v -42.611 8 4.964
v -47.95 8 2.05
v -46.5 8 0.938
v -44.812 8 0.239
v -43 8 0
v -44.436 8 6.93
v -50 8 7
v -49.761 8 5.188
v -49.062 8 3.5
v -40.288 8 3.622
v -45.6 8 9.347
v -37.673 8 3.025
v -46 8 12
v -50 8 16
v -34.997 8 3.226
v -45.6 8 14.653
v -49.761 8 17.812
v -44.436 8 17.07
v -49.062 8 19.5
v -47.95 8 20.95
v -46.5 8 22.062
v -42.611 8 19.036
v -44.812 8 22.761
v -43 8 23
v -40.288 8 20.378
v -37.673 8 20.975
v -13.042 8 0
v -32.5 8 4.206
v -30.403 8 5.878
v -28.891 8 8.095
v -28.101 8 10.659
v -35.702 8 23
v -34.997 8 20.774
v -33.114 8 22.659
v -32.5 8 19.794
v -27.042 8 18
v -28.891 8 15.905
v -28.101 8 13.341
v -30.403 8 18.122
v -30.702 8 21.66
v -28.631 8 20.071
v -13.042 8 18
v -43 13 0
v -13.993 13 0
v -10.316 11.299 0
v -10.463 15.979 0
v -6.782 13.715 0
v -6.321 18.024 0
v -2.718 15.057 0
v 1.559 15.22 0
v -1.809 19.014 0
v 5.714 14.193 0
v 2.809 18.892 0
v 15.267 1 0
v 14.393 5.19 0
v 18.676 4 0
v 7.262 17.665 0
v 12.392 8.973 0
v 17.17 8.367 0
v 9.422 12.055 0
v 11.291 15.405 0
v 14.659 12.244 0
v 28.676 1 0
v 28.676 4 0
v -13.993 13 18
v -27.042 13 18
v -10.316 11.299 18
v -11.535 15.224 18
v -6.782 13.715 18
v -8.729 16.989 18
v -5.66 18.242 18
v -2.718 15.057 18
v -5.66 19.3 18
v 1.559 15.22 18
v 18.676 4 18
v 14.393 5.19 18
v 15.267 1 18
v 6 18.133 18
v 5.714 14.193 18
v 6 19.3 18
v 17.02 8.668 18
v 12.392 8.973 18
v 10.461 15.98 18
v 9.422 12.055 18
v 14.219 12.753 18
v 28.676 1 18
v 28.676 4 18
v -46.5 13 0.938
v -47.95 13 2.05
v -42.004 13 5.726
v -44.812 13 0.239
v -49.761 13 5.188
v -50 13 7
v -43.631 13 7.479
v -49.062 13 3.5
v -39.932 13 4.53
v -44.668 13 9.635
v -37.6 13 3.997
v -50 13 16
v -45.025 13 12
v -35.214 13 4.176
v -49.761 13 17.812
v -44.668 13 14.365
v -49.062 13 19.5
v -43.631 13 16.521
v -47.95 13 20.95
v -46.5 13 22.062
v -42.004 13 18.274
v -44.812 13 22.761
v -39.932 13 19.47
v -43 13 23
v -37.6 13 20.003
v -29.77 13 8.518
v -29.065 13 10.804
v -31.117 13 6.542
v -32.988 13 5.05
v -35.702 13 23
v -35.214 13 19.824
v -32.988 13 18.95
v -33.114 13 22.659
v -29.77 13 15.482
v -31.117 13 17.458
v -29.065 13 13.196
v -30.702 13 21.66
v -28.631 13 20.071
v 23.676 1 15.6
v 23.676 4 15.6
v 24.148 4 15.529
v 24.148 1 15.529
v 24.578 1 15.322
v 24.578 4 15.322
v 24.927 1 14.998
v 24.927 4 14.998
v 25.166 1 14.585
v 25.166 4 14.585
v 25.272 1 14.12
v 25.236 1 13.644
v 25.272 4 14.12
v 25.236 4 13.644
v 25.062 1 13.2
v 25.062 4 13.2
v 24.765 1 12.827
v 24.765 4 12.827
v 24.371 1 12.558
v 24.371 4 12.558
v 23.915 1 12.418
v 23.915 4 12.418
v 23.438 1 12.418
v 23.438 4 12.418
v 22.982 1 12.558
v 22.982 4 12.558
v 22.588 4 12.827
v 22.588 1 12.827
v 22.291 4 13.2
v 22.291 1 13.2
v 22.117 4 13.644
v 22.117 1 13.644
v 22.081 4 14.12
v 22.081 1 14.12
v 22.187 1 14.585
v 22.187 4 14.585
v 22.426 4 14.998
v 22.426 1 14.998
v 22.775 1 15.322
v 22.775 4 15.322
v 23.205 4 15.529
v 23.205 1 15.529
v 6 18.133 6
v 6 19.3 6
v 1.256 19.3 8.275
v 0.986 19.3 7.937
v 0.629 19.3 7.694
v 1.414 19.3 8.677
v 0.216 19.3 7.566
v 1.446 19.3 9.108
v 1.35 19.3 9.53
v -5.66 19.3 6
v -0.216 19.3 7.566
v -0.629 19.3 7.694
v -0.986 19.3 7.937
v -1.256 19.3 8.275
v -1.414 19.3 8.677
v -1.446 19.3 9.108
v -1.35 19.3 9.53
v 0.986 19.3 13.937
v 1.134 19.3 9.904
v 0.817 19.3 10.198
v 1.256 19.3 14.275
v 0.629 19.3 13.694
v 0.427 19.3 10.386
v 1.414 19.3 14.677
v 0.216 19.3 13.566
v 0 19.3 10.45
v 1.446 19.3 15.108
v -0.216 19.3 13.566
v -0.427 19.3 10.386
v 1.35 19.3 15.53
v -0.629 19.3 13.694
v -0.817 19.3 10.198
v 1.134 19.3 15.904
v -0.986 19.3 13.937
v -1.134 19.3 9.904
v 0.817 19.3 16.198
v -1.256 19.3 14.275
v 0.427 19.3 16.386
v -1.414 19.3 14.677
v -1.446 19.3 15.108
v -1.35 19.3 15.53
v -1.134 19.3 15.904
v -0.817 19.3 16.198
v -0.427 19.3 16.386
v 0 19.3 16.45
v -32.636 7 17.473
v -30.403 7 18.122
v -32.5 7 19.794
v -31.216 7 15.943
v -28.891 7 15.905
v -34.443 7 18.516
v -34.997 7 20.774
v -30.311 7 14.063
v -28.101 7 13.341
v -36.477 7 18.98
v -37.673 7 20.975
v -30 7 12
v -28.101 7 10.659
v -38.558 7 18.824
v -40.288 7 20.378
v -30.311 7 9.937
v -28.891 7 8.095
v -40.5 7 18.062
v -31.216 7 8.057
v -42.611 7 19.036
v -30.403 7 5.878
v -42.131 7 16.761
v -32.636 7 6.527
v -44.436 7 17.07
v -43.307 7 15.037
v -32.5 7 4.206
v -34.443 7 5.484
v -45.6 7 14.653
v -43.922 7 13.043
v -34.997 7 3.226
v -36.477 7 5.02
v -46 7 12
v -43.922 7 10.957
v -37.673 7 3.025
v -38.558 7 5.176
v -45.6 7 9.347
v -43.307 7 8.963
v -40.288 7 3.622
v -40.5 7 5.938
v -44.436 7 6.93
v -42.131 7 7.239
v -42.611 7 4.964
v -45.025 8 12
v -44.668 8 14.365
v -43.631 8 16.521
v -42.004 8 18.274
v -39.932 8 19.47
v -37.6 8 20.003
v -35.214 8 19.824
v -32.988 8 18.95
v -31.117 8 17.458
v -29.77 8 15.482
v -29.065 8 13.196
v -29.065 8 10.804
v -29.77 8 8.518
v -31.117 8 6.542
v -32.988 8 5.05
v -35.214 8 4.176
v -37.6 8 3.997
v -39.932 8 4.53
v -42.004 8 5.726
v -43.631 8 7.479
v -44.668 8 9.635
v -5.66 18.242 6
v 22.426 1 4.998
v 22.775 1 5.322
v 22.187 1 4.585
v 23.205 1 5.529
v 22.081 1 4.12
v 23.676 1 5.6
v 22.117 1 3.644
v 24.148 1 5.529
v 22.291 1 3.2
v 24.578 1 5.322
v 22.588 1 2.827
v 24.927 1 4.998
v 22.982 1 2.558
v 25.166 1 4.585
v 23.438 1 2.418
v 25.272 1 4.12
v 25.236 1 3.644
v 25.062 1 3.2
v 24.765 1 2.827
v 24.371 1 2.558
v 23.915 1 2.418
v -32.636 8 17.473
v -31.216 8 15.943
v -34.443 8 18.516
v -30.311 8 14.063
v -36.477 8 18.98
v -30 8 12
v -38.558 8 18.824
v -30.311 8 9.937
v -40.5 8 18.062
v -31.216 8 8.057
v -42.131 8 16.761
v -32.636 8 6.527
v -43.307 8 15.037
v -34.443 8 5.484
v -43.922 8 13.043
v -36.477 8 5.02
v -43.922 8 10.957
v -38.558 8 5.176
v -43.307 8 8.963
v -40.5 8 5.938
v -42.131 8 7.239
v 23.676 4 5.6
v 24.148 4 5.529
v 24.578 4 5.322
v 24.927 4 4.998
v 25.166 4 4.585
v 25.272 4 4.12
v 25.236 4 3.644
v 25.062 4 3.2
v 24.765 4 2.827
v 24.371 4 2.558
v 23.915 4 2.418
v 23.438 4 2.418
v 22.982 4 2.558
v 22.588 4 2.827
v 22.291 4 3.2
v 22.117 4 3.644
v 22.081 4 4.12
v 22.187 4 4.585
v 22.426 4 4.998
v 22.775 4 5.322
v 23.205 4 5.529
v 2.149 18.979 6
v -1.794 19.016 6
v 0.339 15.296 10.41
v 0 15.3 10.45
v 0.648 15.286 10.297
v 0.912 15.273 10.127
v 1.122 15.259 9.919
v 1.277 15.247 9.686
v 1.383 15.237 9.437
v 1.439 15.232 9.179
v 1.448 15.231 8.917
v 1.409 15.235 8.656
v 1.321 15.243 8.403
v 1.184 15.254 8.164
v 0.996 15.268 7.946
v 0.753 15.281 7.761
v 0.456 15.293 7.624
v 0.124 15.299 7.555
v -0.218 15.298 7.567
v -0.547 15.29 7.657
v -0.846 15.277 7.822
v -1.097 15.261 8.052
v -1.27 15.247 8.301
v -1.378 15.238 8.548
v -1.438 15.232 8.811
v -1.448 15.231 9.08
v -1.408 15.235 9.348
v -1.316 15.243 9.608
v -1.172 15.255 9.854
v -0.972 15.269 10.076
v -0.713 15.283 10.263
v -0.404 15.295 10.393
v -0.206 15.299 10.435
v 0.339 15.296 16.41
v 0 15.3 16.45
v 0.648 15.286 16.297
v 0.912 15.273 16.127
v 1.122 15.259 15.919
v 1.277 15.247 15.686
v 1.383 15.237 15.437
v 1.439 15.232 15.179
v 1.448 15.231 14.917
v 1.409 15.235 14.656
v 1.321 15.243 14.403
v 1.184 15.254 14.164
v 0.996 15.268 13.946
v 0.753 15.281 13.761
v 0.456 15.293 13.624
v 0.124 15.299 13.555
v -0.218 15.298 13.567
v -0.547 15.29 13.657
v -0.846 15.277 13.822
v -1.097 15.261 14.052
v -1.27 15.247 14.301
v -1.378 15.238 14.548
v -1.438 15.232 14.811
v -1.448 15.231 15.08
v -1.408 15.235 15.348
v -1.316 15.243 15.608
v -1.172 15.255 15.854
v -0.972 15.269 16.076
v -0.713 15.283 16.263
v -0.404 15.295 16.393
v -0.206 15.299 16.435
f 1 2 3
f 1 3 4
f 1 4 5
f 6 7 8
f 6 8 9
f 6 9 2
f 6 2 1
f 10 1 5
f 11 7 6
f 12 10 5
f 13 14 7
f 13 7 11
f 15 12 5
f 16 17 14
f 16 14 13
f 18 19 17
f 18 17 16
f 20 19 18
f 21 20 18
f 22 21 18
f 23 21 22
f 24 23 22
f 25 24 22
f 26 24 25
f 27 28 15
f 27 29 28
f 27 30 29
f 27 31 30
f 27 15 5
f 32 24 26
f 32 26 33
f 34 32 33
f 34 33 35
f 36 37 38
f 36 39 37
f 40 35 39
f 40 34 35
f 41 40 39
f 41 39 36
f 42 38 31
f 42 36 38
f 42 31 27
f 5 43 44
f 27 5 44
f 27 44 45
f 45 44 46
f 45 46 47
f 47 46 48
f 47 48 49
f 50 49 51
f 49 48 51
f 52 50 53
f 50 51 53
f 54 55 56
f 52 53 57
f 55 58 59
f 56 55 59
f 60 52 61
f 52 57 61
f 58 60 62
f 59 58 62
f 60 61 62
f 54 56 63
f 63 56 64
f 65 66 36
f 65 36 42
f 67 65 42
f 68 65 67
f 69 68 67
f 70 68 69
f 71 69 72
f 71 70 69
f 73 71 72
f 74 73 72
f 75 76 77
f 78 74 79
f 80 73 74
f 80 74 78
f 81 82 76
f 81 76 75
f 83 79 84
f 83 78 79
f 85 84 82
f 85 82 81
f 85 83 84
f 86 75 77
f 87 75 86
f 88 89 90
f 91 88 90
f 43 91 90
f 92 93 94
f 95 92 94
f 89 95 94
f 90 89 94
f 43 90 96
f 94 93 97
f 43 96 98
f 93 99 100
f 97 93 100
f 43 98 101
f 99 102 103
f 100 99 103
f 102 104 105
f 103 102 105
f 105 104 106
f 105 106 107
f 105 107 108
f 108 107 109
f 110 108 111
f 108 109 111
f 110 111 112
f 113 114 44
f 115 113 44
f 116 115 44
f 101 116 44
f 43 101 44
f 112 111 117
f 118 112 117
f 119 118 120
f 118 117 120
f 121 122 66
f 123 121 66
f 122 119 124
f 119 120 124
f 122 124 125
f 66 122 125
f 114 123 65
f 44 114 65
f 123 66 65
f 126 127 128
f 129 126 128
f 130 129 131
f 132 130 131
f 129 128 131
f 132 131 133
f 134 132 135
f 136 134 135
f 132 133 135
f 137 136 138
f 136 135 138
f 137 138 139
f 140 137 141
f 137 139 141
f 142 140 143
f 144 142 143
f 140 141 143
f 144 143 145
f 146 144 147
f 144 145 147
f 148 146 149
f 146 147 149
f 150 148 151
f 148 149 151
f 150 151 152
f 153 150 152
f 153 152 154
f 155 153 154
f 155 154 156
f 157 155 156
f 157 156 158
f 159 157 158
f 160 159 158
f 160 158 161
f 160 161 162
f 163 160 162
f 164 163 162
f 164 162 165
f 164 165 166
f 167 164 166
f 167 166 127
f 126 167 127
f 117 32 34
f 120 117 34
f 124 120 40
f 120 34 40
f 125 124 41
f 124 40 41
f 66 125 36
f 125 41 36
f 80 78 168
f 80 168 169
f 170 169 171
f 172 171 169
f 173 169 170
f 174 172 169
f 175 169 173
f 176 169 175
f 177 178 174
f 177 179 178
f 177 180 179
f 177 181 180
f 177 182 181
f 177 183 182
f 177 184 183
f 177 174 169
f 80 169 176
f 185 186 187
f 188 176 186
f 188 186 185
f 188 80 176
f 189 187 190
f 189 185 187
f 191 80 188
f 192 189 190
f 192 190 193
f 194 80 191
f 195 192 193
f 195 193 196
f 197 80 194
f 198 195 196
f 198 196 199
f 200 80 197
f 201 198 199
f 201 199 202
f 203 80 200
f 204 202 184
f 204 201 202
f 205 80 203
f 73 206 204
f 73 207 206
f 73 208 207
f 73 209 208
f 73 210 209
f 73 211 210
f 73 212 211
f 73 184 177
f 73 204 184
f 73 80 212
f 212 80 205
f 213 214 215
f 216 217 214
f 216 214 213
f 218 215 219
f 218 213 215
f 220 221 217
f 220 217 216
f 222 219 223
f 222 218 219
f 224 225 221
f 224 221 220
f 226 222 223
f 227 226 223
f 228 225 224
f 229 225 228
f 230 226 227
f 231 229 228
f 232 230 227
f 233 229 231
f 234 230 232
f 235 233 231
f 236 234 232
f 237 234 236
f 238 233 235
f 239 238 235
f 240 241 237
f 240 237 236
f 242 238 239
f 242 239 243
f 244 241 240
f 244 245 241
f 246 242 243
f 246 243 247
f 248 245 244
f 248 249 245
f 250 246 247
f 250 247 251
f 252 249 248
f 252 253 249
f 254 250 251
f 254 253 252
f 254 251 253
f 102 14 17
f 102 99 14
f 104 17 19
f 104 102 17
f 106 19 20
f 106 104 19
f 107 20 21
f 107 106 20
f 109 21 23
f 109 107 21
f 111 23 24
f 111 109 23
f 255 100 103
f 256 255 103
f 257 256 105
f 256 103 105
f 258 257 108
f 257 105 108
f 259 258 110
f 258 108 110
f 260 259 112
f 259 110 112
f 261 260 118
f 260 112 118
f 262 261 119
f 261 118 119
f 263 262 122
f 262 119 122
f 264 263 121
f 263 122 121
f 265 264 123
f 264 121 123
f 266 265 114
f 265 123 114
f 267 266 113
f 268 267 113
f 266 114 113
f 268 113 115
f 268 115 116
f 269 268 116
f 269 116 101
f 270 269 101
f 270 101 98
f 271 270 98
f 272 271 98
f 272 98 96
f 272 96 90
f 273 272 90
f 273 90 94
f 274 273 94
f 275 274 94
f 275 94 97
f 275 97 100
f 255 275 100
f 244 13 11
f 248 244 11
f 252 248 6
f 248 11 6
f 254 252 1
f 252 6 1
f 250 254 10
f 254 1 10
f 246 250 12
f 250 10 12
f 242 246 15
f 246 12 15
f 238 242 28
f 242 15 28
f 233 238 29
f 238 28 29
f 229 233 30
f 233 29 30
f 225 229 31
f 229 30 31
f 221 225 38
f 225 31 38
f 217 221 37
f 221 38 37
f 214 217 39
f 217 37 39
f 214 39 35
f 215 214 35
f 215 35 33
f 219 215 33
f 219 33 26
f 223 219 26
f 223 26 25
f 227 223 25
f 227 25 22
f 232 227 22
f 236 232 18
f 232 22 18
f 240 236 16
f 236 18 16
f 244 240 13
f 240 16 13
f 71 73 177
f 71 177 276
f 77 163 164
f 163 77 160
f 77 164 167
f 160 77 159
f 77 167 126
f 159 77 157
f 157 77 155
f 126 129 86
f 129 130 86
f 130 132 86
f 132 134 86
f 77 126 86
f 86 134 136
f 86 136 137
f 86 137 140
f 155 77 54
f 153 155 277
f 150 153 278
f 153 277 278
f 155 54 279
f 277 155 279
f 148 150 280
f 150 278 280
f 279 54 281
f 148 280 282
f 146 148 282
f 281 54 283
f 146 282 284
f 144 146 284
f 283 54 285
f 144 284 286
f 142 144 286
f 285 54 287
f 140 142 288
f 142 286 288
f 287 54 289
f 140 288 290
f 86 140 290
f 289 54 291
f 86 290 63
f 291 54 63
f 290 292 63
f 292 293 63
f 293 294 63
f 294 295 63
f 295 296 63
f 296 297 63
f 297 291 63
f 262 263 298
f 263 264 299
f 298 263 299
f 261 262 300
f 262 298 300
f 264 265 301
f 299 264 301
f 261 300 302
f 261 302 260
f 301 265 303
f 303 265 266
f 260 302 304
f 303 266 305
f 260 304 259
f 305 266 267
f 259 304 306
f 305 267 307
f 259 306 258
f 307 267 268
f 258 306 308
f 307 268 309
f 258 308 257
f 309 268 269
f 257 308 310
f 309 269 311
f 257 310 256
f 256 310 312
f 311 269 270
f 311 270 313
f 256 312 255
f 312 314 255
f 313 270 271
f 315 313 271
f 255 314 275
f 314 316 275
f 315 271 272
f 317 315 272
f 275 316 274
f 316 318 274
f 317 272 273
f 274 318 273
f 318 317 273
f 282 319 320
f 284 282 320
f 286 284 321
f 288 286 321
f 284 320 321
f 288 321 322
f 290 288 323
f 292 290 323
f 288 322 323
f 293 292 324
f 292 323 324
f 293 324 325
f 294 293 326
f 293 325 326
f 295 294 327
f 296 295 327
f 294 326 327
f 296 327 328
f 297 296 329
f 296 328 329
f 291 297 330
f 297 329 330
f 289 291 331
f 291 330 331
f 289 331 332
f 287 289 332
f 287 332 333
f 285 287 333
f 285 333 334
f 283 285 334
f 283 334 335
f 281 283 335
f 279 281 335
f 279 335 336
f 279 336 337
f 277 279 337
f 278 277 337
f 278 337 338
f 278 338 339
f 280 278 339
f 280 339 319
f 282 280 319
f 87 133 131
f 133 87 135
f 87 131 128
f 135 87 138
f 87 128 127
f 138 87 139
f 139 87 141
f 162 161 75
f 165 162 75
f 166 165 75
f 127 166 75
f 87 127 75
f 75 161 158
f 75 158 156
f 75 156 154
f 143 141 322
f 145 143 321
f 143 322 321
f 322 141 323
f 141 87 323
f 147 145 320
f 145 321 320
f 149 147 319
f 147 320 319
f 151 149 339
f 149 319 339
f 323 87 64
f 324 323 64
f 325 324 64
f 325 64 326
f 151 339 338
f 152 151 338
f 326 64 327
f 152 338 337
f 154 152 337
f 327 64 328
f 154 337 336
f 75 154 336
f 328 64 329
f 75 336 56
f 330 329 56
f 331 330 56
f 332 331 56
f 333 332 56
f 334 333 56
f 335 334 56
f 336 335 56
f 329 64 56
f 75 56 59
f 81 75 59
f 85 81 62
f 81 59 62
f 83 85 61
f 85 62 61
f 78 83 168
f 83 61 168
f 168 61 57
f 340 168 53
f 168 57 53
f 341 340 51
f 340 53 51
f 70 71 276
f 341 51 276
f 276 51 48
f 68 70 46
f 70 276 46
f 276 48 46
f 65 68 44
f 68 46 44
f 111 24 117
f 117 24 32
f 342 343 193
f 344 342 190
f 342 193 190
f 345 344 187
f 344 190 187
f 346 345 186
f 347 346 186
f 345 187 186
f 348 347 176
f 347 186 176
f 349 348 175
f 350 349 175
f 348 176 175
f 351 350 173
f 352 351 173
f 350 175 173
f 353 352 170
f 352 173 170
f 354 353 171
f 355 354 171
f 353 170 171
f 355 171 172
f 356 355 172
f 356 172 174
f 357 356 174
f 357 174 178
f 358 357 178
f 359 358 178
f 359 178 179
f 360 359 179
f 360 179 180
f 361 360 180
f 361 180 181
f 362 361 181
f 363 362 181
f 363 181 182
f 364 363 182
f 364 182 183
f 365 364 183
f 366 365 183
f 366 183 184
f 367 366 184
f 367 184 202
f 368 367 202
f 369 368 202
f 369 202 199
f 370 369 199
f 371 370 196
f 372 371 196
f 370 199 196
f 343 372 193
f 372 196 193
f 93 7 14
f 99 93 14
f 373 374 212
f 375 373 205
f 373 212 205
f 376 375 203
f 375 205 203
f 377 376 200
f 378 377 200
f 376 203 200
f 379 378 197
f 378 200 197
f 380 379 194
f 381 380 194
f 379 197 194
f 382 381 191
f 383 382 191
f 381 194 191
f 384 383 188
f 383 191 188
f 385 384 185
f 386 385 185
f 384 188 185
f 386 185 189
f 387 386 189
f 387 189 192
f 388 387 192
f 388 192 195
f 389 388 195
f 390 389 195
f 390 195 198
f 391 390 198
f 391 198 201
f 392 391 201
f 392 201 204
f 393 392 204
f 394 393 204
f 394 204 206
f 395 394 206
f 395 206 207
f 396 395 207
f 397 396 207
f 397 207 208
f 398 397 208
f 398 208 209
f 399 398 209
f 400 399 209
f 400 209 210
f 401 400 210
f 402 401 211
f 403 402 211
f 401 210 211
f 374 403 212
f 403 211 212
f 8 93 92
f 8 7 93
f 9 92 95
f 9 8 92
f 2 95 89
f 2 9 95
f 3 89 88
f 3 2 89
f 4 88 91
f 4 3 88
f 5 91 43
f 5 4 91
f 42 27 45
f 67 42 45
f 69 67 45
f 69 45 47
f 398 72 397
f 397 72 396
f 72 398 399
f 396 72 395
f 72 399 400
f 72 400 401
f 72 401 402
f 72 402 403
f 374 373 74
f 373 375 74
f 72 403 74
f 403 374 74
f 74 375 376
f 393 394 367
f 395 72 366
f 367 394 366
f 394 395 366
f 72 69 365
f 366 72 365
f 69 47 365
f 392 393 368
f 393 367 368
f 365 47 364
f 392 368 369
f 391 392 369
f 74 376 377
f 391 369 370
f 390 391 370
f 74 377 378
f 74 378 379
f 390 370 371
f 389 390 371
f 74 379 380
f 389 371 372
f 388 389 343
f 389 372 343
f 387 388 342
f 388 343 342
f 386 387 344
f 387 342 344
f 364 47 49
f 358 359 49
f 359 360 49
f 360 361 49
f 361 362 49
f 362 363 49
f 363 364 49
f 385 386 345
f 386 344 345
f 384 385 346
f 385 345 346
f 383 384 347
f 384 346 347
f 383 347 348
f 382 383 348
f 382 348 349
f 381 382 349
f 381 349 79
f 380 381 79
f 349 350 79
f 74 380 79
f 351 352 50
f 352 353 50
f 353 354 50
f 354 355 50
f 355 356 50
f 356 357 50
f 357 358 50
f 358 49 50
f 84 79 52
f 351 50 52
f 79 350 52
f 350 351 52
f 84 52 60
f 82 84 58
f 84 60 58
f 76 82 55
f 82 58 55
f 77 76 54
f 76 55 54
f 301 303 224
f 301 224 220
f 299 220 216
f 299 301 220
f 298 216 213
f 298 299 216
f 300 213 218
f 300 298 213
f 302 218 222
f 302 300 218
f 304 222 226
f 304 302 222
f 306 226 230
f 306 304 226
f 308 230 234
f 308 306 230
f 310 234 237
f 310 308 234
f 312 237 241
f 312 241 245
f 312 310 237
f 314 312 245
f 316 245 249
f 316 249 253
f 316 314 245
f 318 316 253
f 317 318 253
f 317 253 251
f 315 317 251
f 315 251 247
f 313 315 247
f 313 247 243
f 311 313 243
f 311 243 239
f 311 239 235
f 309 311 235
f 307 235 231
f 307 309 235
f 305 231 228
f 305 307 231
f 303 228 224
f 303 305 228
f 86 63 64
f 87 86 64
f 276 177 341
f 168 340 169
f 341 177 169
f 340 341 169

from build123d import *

# Parameters (mm, degrees)
BOSS_EXTRUDE1_DEPTH = 18
SKETCH3_R           = 1.6
CUT_EXTRUDE1_DEPTH  = 56.244999774
SKETCH5_W           = 22.958144304
SKETCH5_H           = 5
BOSS_EXTRUDE2_DEPTH = 5
SKETCH6_R           = 8.025
CUT_EXTRUDE2_DEPTH  = 57.329388422
SKETCH7_R           = 9
SKETCH7_R_2         = 7
BOSS_EXTRUDE3_DEPTH = 1
FILLET1_R           = 7
FILLET2_R           = 10
BOSS_EXTRUDE4_DEPTH = 12
SKETCH9_R           = 1.45
CUT_EXTRUDE3_DEPTH  = 4.15


with BuildPart() as part:
    # Sketch1 → Boss-Extrude1 (new body)
    with BuildSketch(Plane.XY):
        with BuildLine():
            Line((15.267285286, 1), (28.676455767, 1))
            Line((28.676455767, 1), (28.676455767, 4))
            Line((28.676455767, 4), (18.676455767, 4))
            ThreePointArc((18.676455767, 4), (5.072789326, 18.414038353), (-13.99321264, 13))
            Line((-13.99321264, 13), (-50, 13))
            Line((-50, 13), (-50, 8))
            Line((-50, 8), (-13.041855696, 8))
            ThreePointArc((-13.041855696, 8), (3.67261953, 14.852672008), (15.267285286, 1))
        make_face()
    extrude(amount=BOSS_EXTRUDE1_DEPTH)

    # Sketch3 → Cut-Extrude1 (cut, through all)
    with BuildSketch(Plane(origin=(0, 4, 0), x_dir=(1, 0, 0), z_dir=(0, 1, 0))):
        with Locations(Location((23.676455767, -4, 0), (0, 0, 270))):
            Circle(SKETCH3_R)
        with Locations(Location((23.676455767, -14, 0), (0, 0, 270))):
            Circle(SKETCH3_R)
    extrude(amount=-CUT_EXTRUDE1_DEPTH, mode=Mode.SUBTRACT)

    # Sketch5 → Boss-Extrude2 (add)
    with BuildSketch(Plane.XZ.offset(-8)):
        with Locations((-38.520927848, 20.5)):
            Rectangle(SKETCH5_W, SKETCH5_H)
    extrude(amount=-BOSS_EXTRUDE2_DEPTH)

    # Sketch6 → Cut-Extrude2 (cut, through all)
    with BuildSketch(Plane(origin=(0, 13, 0), x_dir=(1, 0, 0), z_dir=(0, 1, 0))):
        with Locations(Location((-37, -12, 0), (0, 0, 180))):
            Circle(SKETCH6_R)
    extrude(amount=-CUT_EXTRUDE2_DEPTH, mode=Mode.SUBTRACT)

    # Sketch7 → Boss-Extrude3 (add)
    with BuildSketch(Plane.XZ.offset(-8)):
        with Locations(Location((-37, 12, 0), (0, 0, 180))):
            Circle(SKETCH7_R)
        with Locations((-37, 12)):
            Circle(SKETCH7_R_2, mode=Mode.SUBTRACT)
    extrude(amount=BOSS_EXTRUDE3_DEPTH)

    # Fillet1
    fillet1_edges = [part.edges().sort_by_distance(p)[0] for p in [
        (-50, 10.5, 23),
        (-50, 10.5, 0),
    ]]
    fillet(fillet1_edges, radius=FILLET1_R)

    # Fillet2
    # the kernel refuses this fillet: 10 mm, written as the material it takes off along each edge
    with BuildSketch(Plane(origin=(-27.041855696, -13.650635095, 23), x_dir=(0, 0, -1), z_dir=(0, 1, 0))) as fillet2_piece_1:
        with BuildLine():
            CenterArc((10, 8.660254038), FILLET2_R, 180, 60)
            Line((0, 8.660254038), (-0.2, 8.660254038))
            Line((-0.2, 8.660254038), (-0.2, 0))
            Line((-0.2, 0), (0, -0.2))
            ThreePointArc((0, -0.2), (2.5, -0.2), (4.9, -0.173205081))
            Line((4.9, -0.173205081), (5, 0))
        make_face()
    extrude(amount=48.301270189, mode=Mode.SUBTRACT)

    # Sketch8 → Boss-Extrude4 (add)
    with BuildSketch(Plane.XY.offset(18)):
        Polygon((6, 18.133118871), (6, 19.3), (-5.66, 19.3), (-5.66, 18.242105142), align=None)
    extrude(amount=-BOSS_EXTRUDE4_DEPTH)

    # Sketch9 → Cut-Extrude3 (cut)
    with BuildSketch(Plane(origin=(0, 19.3, 0), x_dir=(1, 0, 0), z_dir=(0, 1, 0))):
        with Locations(Location((0, -15, 0), (0, 0, 270))):
            Circle(SKETCH9_R)
        with Locations(Location((0, -9, 0), (0, 0, 270))):
            Circle(SKETCH9_R)
    extrude(amount=-CUT_EXTRUDE3_DEPTH, mode=Mode.SUBTRACT)


solid = part.part
